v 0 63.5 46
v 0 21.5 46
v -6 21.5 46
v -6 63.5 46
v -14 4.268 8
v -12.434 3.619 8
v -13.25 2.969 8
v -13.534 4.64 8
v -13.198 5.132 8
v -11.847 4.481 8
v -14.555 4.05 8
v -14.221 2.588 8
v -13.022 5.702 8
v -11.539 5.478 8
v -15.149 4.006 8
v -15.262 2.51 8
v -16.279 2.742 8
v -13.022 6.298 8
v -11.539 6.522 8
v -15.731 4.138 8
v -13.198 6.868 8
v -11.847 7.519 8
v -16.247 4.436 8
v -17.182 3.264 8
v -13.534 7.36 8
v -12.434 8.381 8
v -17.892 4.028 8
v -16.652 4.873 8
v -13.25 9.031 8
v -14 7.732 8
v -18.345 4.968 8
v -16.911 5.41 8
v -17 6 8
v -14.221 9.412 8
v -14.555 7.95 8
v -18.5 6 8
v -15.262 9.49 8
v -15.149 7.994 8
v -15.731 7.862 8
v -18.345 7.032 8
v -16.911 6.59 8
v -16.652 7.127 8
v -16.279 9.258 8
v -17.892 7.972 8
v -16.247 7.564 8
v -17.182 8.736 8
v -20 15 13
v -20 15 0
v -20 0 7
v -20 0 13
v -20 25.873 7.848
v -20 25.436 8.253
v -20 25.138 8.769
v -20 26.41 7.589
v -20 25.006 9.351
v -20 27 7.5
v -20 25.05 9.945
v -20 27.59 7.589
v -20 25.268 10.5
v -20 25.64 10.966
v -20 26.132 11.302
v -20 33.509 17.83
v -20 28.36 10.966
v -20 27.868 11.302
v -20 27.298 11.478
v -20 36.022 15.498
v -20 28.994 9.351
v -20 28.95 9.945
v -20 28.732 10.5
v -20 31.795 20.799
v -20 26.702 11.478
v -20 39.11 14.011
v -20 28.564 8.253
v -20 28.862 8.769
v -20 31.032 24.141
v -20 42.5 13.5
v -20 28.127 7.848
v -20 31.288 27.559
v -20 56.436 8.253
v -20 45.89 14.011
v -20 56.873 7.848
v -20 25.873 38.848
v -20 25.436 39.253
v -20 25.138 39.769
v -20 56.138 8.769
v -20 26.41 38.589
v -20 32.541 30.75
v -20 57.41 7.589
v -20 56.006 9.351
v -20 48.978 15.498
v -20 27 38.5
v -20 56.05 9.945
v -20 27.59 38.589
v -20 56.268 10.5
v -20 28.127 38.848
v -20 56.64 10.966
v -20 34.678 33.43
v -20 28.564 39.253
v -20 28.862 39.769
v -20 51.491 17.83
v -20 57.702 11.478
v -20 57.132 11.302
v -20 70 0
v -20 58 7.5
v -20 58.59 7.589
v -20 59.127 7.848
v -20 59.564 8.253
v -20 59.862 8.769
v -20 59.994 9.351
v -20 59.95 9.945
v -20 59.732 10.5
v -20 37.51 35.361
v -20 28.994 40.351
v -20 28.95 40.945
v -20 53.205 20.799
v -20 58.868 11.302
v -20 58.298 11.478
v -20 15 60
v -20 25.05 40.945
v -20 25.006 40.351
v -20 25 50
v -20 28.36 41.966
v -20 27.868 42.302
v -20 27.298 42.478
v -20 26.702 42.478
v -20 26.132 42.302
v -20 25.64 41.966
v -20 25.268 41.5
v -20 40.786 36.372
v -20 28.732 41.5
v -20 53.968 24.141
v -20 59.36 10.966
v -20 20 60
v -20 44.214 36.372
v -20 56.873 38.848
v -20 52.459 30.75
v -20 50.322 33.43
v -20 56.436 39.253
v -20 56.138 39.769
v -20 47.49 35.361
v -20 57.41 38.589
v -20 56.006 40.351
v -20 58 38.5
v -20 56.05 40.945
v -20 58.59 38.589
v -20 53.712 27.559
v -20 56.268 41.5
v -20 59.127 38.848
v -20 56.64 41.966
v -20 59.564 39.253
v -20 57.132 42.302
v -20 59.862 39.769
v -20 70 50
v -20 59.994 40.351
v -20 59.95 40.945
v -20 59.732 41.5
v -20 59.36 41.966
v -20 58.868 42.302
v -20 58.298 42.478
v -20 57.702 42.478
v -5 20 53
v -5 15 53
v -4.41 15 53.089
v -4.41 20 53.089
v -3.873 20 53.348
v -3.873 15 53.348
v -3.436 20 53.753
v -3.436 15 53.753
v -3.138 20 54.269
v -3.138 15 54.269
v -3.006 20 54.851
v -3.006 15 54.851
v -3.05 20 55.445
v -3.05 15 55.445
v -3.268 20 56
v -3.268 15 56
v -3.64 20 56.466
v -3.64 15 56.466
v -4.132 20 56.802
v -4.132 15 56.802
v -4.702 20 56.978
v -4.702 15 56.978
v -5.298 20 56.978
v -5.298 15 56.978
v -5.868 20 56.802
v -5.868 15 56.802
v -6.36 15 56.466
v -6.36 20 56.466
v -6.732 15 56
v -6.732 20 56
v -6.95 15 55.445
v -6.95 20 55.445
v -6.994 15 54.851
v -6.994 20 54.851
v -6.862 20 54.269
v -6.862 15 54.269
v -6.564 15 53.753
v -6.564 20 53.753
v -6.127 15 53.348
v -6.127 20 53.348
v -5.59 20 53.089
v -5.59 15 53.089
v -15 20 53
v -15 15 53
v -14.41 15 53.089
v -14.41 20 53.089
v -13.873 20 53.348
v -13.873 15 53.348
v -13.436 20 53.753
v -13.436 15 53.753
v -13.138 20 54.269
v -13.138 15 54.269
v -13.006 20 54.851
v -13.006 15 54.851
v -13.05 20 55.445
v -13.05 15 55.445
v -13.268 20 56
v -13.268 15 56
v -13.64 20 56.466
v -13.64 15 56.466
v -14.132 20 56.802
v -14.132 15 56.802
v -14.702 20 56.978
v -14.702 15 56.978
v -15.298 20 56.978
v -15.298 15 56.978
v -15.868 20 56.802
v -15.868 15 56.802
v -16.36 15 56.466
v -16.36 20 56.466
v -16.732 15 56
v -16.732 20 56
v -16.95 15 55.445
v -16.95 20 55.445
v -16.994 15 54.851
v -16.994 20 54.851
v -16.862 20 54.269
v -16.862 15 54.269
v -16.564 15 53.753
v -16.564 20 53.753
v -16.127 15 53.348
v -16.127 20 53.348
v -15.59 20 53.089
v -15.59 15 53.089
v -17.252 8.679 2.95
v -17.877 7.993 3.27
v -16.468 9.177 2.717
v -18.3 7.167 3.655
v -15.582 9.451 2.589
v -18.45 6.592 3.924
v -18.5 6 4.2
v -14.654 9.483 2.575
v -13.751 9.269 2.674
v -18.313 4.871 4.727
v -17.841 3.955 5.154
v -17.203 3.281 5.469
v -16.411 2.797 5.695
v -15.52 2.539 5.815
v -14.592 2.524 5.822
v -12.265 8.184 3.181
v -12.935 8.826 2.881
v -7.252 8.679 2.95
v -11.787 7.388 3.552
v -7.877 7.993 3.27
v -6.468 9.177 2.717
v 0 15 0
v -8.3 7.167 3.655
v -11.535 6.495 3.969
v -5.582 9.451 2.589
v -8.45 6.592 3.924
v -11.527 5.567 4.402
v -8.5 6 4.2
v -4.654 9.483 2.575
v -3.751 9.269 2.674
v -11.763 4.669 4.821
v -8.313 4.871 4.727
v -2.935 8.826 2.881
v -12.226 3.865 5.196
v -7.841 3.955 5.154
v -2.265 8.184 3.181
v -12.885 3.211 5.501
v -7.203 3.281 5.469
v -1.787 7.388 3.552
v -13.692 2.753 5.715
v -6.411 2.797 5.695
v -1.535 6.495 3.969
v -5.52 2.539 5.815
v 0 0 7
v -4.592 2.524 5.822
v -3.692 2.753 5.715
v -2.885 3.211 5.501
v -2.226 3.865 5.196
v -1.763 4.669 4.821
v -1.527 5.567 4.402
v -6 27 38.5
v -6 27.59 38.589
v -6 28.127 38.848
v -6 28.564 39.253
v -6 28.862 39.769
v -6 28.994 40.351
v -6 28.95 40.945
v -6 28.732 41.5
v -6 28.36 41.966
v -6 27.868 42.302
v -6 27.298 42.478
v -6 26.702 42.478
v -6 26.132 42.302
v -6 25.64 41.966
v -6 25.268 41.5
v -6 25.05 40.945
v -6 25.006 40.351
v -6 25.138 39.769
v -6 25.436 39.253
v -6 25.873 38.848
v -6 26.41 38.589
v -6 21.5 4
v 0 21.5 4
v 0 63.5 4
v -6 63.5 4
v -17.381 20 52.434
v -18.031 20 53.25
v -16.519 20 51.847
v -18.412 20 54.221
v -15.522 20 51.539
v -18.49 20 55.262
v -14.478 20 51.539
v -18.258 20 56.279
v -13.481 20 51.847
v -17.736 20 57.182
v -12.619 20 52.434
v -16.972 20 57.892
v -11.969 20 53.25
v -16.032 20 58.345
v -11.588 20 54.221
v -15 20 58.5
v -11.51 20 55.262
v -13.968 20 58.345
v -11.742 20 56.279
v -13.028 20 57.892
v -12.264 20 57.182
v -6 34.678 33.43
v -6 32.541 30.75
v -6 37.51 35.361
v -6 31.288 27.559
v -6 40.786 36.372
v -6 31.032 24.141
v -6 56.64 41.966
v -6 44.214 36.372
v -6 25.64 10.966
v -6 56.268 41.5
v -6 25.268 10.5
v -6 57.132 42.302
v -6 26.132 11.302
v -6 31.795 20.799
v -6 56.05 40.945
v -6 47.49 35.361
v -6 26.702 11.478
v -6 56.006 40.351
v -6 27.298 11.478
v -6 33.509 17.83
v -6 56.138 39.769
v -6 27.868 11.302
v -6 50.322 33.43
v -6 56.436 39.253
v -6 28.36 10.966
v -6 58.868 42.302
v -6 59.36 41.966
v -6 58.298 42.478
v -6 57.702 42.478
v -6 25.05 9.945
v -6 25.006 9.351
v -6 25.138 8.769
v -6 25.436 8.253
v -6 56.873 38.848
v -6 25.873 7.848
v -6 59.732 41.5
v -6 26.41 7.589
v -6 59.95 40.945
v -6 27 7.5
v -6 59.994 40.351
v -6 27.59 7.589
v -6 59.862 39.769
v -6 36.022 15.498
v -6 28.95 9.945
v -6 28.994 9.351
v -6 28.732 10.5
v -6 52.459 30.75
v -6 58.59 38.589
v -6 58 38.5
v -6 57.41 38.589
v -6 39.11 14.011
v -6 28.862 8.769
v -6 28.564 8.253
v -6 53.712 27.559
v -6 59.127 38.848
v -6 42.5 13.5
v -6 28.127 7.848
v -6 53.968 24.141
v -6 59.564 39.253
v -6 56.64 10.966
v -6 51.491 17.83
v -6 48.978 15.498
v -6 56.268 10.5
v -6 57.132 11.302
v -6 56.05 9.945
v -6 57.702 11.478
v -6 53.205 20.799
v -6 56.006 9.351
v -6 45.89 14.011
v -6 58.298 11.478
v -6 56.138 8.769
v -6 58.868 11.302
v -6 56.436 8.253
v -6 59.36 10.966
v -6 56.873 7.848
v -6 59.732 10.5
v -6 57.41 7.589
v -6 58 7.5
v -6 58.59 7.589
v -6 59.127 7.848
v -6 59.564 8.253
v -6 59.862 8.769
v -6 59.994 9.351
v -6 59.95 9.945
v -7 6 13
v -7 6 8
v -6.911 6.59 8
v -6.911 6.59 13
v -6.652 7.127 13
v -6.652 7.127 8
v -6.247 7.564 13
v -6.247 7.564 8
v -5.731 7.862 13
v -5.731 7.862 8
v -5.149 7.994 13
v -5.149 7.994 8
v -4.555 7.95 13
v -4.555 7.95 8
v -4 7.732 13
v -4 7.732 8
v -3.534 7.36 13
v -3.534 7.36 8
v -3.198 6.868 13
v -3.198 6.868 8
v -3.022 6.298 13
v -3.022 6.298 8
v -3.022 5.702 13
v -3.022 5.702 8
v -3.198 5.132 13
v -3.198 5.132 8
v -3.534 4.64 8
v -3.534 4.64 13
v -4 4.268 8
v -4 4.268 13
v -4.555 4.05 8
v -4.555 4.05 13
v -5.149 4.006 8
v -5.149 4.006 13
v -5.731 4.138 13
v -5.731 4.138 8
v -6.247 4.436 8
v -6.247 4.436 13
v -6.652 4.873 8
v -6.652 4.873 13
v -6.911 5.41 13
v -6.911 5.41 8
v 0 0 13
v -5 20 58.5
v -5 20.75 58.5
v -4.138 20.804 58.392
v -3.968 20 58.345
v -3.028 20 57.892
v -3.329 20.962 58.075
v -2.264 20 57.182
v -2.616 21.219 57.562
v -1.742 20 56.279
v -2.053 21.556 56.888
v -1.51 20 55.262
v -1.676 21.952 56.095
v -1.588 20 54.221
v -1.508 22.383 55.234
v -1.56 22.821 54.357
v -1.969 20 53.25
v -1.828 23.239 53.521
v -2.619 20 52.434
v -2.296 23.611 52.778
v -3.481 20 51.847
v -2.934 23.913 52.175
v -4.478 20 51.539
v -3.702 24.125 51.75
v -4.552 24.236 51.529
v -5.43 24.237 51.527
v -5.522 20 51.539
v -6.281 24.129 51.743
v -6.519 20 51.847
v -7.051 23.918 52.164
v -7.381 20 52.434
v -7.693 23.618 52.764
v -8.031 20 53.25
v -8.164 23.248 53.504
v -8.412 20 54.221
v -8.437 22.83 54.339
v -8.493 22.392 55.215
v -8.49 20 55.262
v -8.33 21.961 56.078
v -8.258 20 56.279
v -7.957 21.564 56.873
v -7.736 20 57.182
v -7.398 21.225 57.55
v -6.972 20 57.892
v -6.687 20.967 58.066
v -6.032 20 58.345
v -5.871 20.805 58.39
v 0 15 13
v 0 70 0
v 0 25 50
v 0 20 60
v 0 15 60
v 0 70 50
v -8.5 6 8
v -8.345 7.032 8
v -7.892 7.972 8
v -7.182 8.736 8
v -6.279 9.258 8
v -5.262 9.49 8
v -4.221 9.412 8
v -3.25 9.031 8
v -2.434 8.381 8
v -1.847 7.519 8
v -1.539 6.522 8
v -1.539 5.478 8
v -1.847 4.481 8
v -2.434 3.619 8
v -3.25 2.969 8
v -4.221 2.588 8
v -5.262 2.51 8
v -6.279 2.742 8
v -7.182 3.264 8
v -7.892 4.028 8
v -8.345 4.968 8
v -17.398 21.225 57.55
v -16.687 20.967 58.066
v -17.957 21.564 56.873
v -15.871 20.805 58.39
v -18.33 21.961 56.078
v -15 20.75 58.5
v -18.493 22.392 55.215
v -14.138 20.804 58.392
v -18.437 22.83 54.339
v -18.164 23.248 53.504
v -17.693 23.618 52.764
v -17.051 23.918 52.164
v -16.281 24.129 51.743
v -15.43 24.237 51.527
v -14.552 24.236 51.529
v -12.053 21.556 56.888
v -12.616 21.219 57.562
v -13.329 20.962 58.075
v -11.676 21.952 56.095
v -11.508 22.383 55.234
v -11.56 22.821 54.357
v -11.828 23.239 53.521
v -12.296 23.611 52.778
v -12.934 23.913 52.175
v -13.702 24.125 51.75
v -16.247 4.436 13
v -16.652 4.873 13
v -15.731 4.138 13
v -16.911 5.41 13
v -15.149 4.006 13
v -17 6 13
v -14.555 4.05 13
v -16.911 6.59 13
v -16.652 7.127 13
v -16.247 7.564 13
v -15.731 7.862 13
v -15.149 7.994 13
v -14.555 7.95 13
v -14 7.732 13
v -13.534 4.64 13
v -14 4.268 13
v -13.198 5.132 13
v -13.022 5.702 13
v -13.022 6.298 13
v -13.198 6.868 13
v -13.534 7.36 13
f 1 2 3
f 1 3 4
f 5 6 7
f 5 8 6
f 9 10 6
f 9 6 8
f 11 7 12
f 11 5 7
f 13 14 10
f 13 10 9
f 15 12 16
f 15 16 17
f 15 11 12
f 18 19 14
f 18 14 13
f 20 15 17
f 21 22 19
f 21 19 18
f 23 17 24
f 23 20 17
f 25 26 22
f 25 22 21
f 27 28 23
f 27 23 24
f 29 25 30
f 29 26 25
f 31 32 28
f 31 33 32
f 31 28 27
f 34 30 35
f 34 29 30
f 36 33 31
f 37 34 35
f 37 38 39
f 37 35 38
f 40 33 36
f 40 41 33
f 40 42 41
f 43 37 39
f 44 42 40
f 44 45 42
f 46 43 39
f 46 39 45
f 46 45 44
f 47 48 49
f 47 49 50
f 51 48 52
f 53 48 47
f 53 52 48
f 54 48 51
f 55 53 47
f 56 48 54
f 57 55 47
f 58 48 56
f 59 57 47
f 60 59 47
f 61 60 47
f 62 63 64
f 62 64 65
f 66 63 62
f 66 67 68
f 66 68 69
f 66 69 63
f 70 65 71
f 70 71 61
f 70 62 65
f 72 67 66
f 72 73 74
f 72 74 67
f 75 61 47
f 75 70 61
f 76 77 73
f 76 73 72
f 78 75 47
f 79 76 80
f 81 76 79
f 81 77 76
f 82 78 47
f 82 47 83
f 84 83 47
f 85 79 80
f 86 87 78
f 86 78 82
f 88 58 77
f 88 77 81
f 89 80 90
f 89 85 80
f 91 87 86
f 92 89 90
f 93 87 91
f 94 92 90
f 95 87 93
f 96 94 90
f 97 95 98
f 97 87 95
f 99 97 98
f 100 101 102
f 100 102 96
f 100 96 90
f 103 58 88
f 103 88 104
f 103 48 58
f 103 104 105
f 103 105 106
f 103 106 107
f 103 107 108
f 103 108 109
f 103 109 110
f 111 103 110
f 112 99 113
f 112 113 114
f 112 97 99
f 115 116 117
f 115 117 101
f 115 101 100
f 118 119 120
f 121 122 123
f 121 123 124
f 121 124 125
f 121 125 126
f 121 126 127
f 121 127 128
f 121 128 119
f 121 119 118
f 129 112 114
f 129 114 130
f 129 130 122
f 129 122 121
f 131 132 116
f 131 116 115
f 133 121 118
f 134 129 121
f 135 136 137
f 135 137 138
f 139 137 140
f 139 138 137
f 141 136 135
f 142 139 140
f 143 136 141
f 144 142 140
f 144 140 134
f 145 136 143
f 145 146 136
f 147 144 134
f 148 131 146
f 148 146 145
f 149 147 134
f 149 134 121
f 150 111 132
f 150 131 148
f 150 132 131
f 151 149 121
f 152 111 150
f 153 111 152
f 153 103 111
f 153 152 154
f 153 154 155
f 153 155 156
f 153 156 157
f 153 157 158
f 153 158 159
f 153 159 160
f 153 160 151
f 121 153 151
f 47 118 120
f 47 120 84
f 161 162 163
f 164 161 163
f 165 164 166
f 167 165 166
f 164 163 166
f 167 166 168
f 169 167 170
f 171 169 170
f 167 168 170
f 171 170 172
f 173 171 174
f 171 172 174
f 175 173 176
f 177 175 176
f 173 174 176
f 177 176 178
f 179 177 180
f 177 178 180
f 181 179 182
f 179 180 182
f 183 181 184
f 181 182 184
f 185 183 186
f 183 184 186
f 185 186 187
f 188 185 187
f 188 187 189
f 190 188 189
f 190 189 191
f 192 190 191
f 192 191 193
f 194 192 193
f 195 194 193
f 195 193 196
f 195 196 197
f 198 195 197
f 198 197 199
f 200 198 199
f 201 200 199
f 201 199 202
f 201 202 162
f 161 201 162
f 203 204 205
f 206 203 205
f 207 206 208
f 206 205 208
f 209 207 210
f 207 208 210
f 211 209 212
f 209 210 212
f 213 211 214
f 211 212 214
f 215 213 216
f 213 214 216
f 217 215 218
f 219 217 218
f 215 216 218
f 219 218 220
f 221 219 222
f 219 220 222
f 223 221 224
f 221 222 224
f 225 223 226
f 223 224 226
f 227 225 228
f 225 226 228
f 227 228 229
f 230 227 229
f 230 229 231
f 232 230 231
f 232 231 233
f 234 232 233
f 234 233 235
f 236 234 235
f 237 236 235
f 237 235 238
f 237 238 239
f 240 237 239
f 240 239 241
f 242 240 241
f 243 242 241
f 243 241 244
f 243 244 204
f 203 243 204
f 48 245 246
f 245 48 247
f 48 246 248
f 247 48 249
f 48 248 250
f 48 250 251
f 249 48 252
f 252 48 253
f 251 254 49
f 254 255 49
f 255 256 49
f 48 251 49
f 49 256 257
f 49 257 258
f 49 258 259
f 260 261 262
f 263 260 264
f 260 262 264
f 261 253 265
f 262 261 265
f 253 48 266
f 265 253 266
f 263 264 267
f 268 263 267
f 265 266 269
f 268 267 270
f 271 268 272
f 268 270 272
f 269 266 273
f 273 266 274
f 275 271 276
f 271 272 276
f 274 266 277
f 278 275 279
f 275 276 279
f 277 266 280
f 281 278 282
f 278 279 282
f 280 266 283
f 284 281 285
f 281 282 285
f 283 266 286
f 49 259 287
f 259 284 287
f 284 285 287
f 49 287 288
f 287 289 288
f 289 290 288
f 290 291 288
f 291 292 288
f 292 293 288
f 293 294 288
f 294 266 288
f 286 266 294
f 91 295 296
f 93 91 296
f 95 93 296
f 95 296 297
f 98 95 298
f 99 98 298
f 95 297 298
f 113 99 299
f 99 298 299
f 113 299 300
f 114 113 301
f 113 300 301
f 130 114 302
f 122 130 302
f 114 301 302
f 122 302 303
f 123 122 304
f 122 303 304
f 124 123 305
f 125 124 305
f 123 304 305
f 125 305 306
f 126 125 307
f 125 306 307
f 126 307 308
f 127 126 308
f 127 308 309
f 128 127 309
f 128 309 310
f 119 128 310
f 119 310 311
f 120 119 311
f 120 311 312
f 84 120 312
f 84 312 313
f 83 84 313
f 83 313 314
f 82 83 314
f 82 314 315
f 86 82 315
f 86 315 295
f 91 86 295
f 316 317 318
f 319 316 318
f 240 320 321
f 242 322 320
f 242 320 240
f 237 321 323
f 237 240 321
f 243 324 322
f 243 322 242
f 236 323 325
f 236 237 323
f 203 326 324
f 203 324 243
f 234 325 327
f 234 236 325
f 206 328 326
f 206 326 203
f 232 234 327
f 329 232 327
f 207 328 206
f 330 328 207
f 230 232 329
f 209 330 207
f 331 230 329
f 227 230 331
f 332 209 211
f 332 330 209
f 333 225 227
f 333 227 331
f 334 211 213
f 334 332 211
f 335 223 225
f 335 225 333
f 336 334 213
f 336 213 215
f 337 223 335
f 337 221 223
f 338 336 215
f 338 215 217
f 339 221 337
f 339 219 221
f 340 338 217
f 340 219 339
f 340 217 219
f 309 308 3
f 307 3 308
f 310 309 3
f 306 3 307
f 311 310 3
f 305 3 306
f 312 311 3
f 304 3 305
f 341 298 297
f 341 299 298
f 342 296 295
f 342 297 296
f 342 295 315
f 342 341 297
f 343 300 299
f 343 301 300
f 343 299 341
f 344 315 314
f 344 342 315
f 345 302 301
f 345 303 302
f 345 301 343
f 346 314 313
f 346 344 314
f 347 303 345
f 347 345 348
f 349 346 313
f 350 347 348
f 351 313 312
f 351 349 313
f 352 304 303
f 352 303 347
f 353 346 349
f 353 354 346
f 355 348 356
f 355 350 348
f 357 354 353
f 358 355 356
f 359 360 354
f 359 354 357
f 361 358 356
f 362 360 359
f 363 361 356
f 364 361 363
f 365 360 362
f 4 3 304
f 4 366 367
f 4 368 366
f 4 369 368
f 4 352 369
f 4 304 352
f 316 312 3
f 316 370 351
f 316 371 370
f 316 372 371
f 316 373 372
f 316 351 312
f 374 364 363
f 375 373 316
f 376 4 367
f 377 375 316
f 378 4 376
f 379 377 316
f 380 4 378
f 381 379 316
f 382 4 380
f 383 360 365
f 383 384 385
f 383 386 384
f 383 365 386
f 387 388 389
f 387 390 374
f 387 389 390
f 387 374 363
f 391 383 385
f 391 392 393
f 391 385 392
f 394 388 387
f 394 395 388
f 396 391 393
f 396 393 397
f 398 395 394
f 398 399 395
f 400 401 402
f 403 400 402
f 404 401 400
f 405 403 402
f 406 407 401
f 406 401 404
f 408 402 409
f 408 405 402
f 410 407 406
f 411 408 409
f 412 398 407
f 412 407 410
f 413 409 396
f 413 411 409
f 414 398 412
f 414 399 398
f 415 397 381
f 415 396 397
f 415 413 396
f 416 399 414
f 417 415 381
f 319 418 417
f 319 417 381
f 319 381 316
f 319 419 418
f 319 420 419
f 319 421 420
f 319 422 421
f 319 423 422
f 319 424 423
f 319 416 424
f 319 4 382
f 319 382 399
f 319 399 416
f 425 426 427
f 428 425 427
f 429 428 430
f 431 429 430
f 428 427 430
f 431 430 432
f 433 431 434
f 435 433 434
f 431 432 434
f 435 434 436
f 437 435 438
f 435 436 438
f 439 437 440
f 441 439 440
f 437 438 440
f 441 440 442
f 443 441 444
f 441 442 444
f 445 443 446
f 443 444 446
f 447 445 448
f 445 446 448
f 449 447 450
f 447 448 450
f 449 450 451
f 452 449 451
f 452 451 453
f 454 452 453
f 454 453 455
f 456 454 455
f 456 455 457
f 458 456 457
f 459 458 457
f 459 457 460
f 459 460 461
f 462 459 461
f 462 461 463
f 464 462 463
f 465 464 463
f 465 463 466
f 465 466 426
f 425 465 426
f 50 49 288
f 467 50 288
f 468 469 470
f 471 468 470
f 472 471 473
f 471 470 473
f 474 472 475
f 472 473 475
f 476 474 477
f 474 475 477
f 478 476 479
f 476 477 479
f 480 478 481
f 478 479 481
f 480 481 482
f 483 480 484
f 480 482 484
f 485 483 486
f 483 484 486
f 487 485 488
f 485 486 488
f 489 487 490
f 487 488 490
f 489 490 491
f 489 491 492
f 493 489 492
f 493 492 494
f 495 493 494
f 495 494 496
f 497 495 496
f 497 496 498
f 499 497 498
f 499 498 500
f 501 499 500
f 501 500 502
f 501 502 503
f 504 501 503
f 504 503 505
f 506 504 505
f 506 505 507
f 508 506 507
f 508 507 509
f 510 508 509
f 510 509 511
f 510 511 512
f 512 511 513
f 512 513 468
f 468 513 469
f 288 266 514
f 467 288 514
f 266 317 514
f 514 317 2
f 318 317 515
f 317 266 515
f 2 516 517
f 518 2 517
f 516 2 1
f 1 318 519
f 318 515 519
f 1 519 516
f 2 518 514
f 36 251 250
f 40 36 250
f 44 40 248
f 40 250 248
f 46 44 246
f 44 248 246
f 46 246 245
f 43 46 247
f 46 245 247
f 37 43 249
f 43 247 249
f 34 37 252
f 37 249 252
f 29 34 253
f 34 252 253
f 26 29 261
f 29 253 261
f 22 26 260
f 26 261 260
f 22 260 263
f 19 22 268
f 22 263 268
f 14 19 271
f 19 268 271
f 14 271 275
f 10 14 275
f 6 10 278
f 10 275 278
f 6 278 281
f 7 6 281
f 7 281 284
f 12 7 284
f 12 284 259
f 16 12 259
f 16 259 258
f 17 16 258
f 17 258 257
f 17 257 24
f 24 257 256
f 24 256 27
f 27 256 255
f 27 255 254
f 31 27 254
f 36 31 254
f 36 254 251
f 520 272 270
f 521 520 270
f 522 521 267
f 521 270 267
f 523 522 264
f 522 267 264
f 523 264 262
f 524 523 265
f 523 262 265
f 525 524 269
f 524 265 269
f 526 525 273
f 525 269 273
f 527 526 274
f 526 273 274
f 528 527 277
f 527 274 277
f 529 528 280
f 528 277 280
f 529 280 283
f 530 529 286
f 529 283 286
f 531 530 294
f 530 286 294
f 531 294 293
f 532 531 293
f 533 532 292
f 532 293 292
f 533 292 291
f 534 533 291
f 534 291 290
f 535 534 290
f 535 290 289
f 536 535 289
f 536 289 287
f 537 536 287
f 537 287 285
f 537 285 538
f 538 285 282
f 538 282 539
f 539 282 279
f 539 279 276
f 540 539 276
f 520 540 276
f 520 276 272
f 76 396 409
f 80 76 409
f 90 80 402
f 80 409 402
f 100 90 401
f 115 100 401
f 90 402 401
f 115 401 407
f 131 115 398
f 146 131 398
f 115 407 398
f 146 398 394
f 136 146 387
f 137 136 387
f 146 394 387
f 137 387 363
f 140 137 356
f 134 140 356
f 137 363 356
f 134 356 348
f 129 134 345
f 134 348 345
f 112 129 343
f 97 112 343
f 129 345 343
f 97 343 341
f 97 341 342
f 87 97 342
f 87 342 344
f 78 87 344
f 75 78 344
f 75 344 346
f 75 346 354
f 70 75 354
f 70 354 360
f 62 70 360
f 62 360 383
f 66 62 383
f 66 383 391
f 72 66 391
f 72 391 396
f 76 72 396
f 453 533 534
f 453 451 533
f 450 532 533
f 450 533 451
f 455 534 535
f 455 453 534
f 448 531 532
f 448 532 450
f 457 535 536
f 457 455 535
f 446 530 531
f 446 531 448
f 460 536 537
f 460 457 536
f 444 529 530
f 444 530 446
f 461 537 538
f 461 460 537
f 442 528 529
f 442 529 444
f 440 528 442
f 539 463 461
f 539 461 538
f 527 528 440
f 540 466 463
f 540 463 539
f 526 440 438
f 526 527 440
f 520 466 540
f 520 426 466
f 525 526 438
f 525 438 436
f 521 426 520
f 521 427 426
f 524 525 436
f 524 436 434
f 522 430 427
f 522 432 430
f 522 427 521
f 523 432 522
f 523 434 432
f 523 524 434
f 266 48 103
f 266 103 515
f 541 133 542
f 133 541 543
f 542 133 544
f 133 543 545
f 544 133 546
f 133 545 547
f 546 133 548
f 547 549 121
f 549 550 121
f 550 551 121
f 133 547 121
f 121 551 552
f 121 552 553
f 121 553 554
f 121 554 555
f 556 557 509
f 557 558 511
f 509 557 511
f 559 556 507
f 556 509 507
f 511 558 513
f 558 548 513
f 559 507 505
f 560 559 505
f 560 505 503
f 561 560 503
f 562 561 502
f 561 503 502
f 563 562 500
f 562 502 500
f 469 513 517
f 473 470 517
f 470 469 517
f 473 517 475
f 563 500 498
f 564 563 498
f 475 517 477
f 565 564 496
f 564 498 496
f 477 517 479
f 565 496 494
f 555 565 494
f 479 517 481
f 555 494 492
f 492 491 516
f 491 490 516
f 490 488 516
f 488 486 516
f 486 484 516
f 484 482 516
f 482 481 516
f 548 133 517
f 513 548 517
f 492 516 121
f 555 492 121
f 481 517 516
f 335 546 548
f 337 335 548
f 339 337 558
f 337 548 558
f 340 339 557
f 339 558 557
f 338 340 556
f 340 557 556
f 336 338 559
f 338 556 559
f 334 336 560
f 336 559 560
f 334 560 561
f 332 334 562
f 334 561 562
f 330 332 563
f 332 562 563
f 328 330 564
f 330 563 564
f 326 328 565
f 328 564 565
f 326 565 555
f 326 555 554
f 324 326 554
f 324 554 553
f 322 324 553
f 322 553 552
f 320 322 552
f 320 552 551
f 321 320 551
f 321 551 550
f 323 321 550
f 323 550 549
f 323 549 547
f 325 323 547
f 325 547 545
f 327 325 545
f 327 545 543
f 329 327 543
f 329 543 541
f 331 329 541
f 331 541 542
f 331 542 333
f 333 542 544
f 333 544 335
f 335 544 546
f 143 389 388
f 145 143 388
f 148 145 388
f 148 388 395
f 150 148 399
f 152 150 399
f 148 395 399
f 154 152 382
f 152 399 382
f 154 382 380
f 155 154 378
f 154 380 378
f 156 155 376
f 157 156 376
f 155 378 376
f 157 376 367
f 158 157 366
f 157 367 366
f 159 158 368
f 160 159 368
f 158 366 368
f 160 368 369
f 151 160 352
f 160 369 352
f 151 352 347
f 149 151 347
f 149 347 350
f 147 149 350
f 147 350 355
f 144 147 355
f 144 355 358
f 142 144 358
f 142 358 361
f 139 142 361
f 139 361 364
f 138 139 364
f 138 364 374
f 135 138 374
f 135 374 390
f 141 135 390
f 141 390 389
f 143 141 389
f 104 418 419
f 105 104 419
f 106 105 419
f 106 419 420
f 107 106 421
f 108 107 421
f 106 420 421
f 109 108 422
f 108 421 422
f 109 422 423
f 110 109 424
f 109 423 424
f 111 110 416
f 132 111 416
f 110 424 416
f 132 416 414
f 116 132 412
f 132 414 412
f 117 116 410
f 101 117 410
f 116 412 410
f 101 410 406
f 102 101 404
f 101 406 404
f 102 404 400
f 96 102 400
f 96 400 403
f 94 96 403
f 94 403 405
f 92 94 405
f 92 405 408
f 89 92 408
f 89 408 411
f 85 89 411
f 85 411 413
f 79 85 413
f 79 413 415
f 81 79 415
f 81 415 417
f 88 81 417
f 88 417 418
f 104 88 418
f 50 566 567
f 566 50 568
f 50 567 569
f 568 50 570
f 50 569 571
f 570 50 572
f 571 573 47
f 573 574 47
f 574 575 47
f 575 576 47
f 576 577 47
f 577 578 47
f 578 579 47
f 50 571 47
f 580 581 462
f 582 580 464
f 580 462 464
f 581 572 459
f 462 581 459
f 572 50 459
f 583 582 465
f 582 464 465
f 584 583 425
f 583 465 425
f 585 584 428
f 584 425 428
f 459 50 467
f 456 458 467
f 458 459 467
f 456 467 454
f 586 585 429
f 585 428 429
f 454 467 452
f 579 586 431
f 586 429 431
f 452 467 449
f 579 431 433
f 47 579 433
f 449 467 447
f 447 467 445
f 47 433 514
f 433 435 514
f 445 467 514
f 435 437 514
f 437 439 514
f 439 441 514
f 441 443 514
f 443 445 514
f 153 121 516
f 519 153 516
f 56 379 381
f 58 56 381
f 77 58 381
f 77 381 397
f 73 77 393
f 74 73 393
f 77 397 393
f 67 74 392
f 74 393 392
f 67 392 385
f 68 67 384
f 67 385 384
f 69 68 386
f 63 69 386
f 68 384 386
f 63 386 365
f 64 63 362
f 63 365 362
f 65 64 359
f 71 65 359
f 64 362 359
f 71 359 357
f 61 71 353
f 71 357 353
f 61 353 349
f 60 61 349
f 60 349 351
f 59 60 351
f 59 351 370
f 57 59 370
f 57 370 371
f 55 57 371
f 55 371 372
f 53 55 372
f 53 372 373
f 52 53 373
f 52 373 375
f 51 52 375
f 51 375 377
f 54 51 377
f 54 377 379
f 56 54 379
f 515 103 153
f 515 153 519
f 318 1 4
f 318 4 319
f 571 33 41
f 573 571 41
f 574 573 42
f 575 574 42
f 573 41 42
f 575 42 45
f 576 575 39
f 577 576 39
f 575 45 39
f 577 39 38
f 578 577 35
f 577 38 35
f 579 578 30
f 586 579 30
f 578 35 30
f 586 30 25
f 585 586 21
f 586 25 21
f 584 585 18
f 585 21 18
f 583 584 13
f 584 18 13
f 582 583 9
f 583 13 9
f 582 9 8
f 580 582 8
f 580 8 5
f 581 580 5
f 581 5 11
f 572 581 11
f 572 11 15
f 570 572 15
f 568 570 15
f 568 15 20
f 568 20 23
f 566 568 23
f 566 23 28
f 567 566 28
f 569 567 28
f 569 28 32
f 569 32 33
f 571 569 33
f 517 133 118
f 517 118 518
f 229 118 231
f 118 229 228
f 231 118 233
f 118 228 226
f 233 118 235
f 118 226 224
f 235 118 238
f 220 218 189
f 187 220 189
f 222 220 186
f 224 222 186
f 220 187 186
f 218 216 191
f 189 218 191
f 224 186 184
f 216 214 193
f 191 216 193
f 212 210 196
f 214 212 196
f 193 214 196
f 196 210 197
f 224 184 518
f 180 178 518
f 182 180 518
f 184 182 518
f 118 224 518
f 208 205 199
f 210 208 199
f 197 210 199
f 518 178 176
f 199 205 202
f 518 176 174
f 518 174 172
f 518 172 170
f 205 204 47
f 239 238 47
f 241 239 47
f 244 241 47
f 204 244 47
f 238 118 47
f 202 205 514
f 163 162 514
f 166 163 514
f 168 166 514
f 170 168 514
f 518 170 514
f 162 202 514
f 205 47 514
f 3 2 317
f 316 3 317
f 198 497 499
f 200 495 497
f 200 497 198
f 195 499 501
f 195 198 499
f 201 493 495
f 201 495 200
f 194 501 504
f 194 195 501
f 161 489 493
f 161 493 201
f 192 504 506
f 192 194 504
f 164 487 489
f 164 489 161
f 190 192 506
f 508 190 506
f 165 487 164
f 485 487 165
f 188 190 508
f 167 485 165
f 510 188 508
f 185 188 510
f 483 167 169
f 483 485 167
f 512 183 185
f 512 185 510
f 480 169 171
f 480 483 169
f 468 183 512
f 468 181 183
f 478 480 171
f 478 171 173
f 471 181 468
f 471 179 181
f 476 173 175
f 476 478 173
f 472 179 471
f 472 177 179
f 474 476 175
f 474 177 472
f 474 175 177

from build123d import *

# Parameters (mm, degrees)
SKETCH1_W           = 20
SKETCH1_H           = 50
BOSS_EXTRUDE1_DEPTH = 70
SKETCH2_R           = 2
SKETCH2_R_2         = 11.5
CUT_EXTRUDE2_DEPTH  = 60
SKETCH4_W           = 37
SKETCH4_H           = 15
CUT_EXTRUDE3_DEPTH  = 60
SKETCH8_R           = 2
CUT_EXTRUDE5_DEPTH  = 15
SKETCH9_W           = 42
SKETCH9_H           = 42
CUT_EXTRUDE6_DEPTH  = 6
CUT_EXTRUDE8_DEPTH  = 30
SKETCH12_W          = 20
SKETCH12_H          = 5
BOSS_EXTRUDE2_DEPTH = 10
BOSS_EXTRUDE3_DEPTH = 20
SKETCH15_R          = 2
CUT_EXTRUDE9_DEPTH  = 10
SKETCH17_R          = 3.5
CUT_EXTRUDE11_DEPTH = 8
SKETCH18_R          = 3.5
CUT_EXTRUDE12_DEPTH = 50


with BuildPart() as part:
    # Sketch1 → Boss-Extrude1 (new body)
    with BuildSketch(Plane(origin=(0, 0, 0), x_dir=(1, 0, 0), z_dir=(0, 1, 0))):
        with Locations((-10, -25)):
            Rectangle(SKETCH1_W, SKETCH1_H)
    extrude(amount=BOSS_EXTRUDE1_DEPTH)

    # Sketch2 → Cut-Extrude2 (cut)
    with BuildSketch(Plane(origin=(0, 0, 0), x_dir=(0, 0, -1), z_dir=(1, 0, 0))):
        with Locations((-9.5, 58)):
            Circle(SKETCH2_R)
        with Locations((-25, 42.5)):
            Circle(SKETCH2_R_2)
        with Locations((-9.5, 27)):
            Circle(SKETCH2_R)
        with Locations((-40.5, 27)):
            Circle(SKETCH2_R)
        with Locations((-40.5, 58)):
            Circle(SKETCH2_R)
    extrude(amount=-CUT_EXTRUDE2_DEPTH, mode=Mode.SUBTRACT)

    # Sketch4 → Cut-Extrude3 (cut)
    with BuildSketch(Plane(origin=(0, 0, 0), x_dir=(0, 0, -1), z_dir=(1, 0, 0))):
        with Locations((-31.5, 7.5)):
            Rectangle(SKETCH4_W, SKETCH4_H)
    extrude(amount=-CUT_EXTRUDE3_DEPTH, mode=Mode.SUBTRACT)

    # Sketch8 → Cut-Extrude5 (cut)
    with BuildSketch(Plane(origin=(0, 0, 0), x_dir=(-1, 0, 0), z_dir=(0, 0, -1))):
        with Locations((15, 6)):
            Circle(SKETCH8_R)
        with Locations((5, 6)):
            Circle(SKETCH8_R)
    extrude(amount=-CUT_EXTRUDE5_DEPTH, mode=Mode.SUBTRACT)

    # Sketch9 → Cut-Extrude6 (cut)
    with BuildSketch(Plane(origin=(0, 0, 0), x_dir=(0, 0, -1), z_dir=(1, 0, 0))):
        with Locations((-25, 42.5)):
            Rectangle(SKETCH9_W, SKETCH9_H)
    extrude(amount=-CUT_EXTRUDE6_DEPTH, mode=Mode.SUBTRACT)

    # Sketch11 → Cut-Extrude8 (cut)
    with BuildSketch(Plane(origin=(0, 0, 0), x_dir=(0, 0, -1), z_dir=(1, 0, 0))):
        Polygon((-7, 0), (0, 0), (0, 15), align=None)
    extrude(amount=-CUT_EXTRUDE8_DEPTH, mode=Mode.SUBTRACT)

    # Sketch12 → Boss-Extrude2 (add)
    with BuildSketch(Plane.XY.offset(50)):
        with Locations((-10, 17.5)):
            Rectangle(SKETCH12_W, SKETCH12_H)
    extrude(amount=BOSS_EXTRUDE2_DEPTH)

    # Sketch14 → Boss-Extrude3 (add)
    with BuildSketch(Plane(origin=(0, 0, 0), x_dir=(0, 0, -1), z_dir=(1, 0, 0))):
        Polygon((-50, 20), (-60, 20), (-50, 25), align=None)
    extrude(amount=-BOSS_EXTRUDE3_DEPTH)

    # Sketch15 → Cut-Extrude9 (cut)
    with BuildSketch(Plane(origin=(0, 15, 0), x_dir=(-1, 0, 0), z_dir=(0, -1, 0))):
        with Locations(Location((5, -55, 0), (0, 0, 90))):
            Circle(SKETCH15_R)
        with Locations(Location((15, -55, 0), (0, 0, 90))):
            Circle(SKETCH15_R)
    extrude(amount=-CUT_EXTRUDE9_DEPTH, mode=Mode.SUBTRACT)

    # Sketch17 → Cut-Extrude11 (cut)
    with BuildSketch(Plane(origin=(0, 0, 0), x_dir=(-1, 0, 0), z_dir=(0, 0, -1))):
        with Locations((15, 6)):
            Circle(SKETCH17_R)
        with Locations((5, 6)):
            Circle(SKETCH17_R)
    extrude(amount=-CUT_EXTRUDE11_DEPTH, mode=Mode.SUBTRACT)

    # Sketch18 → Cut-Extrude12 (cut)
    with BuildSketch(Plane(origin=(0, 70, 0), x_dir=(1, 0, 0), z_dir=(0, 1, 0))):
        with Locations(Location((-15, -55, 0), (0, 0, 270))):
            Circle(SKETCH18_R)
        with Locations(Location((-5, -55, 0), (0, 0, 270))):
            Circle(SKETCH18_R)
    extrude(amount=-CUT_EXTRUDE12_DEPTH, mode=Mode.SUBTRACT)


solid = part.part
